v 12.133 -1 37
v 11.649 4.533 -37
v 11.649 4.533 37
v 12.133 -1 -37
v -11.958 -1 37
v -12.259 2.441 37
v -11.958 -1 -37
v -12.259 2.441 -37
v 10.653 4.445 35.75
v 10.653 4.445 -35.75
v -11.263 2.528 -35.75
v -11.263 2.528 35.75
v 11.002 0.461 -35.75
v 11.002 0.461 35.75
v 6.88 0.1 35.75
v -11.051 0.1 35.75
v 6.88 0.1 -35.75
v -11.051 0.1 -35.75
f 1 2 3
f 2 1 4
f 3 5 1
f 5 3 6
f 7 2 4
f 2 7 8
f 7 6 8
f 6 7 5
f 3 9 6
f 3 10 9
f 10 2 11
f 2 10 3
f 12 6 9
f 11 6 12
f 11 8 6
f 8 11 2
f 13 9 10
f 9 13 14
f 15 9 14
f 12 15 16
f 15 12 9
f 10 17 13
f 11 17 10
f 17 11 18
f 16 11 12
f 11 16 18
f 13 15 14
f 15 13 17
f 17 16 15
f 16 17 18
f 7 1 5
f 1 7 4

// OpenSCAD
difference() {
    union() {
        translate([0.18, -2.4, 0]) cube([23.6, 5, 74], true);
        rotate(5) difference() {
            cube([24, 7, 74], true);
            translate([0, 2, 0]) cube([22, 5, 71.5], true);
        }
    }
    translate([0.18, -3.5, 0]) cube([24.5, 5, 74.5], true);
}
